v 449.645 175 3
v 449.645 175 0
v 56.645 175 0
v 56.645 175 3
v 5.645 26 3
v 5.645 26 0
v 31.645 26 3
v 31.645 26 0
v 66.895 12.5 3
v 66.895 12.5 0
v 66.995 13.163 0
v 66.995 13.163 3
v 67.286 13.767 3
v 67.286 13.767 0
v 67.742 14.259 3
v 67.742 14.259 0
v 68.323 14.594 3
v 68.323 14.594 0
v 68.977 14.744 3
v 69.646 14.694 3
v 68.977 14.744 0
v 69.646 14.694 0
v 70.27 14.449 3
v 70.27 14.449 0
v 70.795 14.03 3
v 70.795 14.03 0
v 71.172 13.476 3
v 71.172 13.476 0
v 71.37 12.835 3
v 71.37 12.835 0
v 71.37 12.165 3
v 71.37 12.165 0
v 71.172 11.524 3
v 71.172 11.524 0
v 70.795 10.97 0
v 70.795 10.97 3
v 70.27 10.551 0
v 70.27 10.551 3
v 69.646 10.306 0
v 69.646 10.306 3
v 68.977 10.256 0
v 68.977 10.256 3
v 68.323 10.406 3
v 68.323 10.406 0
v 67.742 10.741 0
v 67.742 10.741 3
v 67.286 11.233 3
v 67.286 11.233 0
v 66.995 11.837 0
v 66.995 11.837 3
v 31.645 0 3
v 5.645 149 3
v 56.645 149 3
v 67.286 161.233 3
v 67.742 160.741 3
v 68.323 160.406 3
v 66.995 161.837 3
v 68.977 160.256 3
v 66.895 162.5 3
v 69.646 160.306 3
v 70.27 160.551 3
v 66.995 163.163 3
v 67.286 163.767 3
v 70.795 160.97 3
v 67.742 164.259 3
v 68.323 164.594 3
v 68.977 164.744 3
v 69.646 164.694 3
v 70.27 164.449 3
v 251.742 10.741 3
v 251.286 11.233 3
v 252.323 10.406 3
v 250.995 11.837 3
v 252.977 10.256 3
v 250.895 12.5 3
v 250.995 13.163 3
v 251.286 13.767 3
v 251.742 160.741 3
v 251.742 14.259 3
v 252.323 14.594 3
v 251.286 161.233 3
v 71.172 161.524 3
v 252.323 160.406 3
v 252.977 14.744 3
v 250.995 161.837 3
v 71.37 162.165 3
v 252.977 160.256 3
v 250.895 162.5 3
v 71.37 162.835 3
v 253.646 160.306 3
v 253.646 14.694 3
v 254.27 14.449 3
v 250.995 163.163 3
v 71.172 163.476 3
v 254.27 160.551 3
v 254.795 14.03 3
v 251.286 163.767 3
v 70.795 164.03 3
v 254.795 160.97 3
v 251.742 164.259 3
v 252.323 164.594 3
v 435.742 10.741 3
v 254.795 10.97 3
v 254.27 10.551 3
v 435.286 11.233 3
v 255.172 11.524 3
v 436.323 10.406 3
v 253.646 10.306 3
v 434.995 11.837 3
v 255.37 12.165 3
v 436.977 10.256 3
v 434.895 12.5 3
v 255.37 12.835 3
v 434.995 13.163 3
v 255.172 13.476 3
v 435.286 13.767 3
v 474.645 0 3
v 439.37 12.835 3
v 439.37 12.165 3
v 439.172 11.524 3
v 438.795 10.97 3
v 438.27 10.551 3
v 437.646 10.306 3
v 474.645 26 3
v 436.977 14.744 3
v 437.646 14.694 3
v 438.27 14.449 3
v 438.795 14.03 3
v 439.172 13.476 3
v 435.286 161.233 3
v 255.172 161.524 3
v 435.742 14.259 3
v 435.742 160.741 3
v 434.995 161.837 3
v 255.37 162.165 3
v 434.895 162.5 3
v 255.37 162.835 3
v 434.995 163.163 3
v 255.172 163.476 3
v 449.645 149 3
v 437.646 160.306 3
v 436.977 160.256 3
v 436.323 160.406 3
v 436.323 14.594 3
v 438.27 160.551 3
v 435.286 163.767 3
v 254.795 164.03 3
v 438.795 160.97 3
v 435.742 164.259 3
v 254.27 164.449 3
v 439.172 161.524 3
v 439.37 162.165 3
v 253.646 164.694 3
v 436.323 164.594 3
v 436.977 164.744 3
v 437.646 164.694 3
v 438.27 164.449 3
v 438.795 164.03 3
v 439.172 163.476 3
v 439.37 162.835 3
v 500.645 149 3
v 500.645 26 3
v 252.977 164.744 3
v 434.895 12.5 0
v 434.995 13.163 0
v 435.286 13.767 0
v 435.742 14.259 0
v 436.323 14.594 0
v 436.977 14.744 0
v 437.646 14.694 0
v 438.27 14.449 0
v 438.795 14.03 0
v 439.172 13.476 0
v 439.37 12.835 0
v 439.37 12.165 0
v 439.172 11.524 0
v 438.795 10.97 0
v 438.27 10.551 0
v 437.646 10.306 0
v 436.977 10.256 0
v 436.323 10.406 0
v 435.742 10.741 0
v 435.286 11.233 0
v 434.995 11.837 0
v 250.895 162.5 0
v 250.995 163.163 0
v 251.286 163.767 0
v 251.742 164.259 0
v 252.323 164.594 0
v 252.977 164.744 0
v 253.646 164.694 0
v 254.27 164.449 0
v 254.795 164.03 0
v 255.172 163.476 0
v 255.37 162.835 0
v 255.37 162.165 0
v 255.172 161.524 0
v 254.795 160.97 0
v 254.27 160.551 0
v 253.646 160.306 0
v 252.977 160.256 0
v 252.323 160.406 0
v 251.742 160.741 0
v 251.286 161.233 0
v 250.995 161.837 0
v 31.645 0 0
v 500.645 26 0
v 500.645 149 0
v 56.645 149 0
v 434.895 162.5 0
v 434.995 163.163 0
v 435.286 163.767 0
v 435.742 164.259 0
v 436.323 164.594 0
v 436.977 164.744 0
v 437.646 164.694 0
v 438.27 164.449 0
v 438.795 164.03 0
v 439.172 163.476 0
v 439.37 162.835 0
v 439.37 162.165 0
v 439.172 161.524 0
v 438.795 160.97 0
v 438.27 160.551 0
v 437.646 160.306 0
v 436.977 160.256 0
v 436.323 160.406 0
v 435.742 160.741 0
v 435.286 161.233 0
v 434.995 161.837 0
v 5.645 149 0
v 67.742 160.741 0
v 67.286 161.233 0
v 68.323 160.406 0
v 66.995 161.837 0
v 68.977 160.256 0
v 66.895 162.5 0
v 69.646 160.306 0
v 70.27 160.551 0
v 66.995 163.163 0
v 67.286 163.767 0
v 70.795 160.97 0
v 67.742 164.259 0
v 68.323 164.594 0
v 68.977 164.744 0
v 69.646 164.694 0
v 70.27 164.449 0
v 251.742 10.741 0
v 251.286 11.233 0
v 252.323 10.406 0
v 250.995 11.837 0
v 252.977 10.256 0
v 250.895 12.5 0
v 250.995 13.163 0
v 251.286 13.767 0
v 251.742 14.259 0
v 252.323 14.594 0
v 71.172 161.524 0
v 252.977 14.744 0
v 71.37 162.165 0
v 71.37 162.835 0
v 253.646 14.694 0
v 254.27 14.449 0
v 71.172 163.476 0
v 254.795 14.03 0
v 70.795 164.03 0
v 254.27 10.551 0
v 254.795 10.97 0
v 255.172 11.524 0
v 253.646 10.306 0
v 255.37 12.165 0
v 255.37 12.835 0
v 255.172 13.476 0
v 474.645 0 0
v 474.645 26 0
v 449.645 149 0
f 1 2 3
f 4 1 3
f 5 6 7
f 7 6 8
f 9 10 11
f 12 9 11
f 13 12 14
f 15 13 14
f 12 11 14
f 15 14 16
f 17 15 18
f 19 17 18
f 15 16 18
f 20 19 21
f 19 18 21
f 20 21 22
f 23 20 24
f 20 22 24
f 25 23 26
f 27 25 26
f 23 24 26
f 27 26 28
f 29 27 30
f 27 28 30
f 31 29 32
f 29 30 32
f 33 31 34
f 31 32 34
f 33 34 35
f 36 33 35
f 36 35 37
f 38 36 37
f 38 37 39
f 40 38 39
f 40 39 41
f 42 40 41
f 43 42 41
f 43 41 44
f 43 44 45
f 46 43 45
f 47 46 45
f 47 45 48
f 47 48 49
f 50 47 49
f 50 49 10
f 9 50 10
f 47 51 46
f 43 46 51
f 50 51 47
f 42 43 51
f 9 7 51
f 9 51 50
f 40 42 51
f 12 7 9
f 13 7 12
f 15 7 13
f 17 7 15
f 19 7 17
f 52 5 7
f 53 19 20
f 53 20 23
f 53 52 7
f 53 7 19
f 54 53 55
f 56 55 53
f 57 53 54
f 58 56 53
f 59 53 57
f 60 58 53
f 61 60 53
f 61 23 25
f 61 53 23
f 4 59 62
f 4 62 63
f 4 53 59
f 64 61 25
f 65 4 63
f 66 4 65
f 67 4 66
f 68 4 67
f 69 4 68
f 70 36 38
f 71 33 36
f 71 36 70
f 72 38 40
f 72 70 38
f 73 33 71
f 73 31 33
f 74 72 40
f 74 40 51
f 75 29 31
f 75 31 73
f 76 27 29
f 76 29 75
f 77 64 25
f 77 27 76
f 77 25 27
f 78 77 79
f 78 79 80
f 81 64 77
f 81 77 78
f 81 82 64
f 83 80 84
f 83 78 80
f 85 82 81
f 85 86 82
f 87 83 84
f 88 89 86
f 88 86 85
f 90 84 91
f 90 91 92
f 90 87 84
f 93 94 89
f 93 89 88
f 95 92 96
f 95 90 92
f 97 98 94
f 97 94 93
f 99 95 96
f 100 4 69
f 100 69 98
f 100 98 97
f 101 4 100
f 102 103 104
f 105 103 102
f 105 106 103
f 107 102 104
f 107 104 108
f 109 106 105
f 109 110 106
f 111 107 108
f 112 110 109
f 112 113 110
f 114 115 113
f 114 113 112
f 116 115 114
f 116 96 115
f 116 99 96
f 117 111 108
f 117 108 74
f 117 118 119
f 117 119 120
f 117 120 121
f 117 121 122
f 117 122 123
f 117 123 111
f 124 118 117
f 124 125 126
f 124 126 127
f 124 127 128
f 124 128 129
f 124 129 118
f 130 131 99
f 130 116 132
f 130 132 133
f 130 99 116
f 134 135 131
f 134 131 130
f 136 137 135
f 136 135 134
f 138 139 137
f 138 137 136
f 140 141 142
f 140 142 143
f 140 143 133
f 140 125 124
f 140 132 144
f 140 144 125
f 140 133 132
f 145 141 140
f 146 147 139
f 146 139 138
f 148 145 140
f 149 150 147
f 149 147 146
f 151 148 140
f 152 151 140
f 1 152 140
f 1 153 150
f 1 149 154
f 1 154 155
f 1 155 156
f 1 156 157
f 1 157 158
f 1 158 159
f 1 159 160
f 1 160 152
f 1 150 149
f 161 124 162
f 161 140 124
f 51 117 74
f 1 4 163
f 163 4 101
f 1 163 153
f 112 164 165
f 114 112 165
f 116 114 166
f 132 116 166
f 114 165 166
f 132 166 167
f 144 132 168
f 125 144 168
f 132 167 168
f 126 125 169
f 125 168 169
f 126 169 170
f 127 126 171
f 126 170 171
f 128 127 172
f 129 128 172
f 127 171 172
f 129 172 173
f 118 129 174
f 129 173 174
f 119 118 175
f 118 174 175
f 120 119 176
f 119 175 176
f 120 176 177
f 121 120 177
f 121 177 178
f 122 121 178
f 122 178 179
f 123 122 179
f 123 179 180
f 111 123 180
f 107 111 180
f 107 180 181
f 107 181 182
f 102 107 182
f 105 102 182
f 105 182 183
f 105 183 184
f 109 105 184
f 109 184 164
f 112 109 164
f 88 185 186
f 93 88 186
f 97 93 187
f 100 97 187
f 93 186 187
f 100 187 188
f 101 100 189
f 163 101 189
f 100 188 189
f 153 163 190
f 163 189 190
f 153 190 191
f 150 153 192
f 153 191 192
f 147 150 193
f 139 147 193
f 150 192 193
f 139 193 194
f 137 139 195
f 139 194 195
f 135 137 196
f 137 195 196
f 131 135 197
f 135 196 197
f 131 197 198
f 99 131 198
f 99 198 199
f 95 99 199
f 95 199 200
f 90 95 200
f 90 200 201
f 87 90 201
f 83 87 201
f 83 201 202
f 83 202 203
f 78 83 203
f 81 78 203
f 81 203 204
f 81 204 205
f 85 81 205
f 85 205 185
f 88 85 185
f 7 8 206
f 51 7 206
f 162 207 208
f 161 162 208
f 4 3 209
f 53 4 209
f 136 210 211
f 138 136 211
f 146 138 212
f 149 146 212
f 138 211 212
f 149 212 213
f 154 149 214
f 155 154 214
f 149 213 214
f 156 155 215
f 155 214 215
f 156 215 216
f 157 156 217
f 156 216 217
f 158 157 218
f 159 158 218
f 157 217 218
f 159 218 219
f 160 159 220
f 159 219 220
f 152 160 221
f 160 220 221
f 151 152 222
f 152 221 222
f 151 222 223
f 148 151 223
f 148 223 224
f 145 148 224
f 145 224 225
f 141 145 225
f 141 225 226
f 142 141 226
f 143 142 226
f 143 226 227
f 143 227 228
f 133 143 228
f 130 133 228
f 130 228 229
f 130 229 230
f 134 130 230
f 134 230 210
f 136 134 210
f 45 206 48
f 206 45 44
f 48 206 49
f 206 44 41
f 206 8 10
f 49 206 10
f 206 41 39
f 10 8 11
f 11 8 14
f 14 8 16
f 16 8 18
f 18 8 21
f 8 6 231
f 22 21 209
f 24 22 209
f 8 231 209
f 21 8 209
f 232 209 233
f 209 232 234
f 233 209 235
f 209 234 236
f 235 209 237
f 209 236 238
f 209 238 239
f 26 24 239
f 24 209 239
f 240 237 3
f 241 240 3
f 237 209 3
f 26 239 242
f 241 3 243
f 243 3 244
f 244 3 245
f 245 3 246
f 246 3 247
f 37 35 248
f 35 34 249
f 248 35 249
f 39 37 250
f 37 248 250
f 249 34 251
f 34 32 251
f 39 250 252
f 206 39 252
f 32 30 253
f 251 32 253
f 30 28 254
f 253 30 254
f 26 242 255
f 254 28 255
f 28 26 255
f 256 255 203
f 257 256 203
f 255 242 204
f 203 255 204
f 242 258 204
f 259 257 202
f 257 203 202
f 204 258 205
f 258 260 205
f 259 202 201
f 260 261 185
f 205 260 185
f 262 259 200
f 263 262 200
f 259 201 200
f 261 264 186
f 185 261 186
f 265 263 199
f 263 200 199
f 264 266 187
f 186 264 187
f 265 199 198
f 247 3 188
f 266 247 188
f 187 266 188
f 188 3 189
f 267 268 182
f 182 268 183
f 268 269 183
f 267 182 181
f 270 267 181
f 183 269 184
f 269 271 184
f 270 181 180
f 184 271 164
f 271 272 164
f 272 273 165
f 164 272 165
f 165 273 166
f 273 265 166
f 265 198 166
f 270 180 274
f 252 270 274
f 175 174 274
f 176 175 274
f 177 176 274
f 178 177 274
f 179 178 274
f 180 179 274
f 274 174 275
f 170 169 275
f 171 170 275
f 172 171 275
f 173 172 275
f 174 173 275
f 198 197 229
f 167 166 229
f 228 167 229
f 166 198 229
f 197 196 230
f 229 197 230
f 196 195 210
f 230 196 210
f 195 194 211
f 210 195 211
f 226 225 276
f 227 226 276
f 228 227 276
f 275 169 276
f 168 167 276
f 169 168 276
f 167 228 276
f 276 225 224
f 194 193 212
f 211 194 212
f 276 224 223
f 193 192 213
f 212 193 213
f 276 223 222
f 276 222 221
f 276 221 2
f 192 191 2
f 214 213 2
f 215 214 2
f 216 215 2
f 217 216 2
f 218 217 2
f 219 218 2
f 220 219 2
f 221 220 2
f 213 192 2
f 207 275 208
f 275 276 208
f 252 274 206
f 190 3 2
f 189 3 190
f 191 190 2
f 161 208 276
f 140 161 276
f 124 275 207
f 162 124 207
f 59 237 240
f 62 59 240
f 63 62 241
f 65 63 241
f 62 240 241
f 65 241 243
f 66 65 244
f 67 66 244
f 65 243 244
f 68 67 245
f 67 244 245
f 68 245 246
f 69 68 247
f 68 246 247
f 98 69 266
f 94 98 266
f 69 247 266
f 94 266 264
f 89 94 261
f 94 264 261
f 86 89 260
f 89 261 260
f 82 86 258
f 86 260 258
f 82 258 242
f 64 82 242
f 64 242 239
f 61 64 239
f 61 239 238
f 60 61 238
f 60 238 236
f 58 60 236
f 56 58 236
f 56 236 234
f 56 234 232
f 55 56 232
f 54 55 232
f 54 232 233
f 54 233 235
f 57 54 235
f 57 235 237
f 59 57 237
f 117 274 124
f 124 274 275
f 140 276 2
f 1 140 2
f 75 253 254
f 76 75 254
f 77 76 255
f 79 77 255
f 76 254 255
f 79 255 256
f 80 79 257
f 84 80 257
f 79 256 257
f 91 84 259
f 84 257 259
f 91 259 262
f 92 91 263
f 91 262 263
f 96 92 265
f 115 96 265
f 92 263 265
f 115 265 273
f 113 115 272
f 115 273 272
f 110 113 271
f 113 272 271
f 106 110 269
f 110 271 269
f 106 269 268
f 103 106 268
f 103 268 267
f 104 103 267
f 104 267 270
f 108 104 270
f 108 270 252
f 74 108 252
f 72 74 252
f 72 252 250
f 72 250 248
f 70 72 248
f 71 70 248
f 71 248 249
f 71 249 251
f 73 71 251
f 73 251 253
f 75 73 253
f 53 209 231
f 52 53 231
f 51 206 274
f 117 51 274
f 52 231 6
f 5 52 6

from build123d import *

# Parameters (mm, degrees)
BOSS_EXTRUDE1_DEPTH  = 3
M4_CLEARANCE_HOLE1_D = 4.5


with BuildPart() as part:
    # Sketch1 → Boss-Extrude1 (new body)
    with BuildSketch(Plane.XY):
        Polygon((31.645266951, 0), (474.645266951, 0), (474.645266951, 26), (500.645266951, 26), (500.645266951, 149), (449.645266951, 149), (449.645266951, 175), (56.645266951, 175), (56.645266951, 149), (5.645266951, 149), (5.645266951, 26), (31.645266951, 26), align=None)
    extrude(amount=BOSS_EXTRUDE1_DEPTH)

    # M4 Clearance Hole1 (through all)
    with Locations(Plane.XY.offset(3)):
        with Locations((253.145266951, 12.5), (253.145266951, 162.5), (437.145266951, 12.5), (437.145266951, 162.5), (69.145266951, 162.5), (69.145266951, 12.5)):
            Hole(M4_CLEARANCE_HOLE1_D / 2)


solid = part.part
